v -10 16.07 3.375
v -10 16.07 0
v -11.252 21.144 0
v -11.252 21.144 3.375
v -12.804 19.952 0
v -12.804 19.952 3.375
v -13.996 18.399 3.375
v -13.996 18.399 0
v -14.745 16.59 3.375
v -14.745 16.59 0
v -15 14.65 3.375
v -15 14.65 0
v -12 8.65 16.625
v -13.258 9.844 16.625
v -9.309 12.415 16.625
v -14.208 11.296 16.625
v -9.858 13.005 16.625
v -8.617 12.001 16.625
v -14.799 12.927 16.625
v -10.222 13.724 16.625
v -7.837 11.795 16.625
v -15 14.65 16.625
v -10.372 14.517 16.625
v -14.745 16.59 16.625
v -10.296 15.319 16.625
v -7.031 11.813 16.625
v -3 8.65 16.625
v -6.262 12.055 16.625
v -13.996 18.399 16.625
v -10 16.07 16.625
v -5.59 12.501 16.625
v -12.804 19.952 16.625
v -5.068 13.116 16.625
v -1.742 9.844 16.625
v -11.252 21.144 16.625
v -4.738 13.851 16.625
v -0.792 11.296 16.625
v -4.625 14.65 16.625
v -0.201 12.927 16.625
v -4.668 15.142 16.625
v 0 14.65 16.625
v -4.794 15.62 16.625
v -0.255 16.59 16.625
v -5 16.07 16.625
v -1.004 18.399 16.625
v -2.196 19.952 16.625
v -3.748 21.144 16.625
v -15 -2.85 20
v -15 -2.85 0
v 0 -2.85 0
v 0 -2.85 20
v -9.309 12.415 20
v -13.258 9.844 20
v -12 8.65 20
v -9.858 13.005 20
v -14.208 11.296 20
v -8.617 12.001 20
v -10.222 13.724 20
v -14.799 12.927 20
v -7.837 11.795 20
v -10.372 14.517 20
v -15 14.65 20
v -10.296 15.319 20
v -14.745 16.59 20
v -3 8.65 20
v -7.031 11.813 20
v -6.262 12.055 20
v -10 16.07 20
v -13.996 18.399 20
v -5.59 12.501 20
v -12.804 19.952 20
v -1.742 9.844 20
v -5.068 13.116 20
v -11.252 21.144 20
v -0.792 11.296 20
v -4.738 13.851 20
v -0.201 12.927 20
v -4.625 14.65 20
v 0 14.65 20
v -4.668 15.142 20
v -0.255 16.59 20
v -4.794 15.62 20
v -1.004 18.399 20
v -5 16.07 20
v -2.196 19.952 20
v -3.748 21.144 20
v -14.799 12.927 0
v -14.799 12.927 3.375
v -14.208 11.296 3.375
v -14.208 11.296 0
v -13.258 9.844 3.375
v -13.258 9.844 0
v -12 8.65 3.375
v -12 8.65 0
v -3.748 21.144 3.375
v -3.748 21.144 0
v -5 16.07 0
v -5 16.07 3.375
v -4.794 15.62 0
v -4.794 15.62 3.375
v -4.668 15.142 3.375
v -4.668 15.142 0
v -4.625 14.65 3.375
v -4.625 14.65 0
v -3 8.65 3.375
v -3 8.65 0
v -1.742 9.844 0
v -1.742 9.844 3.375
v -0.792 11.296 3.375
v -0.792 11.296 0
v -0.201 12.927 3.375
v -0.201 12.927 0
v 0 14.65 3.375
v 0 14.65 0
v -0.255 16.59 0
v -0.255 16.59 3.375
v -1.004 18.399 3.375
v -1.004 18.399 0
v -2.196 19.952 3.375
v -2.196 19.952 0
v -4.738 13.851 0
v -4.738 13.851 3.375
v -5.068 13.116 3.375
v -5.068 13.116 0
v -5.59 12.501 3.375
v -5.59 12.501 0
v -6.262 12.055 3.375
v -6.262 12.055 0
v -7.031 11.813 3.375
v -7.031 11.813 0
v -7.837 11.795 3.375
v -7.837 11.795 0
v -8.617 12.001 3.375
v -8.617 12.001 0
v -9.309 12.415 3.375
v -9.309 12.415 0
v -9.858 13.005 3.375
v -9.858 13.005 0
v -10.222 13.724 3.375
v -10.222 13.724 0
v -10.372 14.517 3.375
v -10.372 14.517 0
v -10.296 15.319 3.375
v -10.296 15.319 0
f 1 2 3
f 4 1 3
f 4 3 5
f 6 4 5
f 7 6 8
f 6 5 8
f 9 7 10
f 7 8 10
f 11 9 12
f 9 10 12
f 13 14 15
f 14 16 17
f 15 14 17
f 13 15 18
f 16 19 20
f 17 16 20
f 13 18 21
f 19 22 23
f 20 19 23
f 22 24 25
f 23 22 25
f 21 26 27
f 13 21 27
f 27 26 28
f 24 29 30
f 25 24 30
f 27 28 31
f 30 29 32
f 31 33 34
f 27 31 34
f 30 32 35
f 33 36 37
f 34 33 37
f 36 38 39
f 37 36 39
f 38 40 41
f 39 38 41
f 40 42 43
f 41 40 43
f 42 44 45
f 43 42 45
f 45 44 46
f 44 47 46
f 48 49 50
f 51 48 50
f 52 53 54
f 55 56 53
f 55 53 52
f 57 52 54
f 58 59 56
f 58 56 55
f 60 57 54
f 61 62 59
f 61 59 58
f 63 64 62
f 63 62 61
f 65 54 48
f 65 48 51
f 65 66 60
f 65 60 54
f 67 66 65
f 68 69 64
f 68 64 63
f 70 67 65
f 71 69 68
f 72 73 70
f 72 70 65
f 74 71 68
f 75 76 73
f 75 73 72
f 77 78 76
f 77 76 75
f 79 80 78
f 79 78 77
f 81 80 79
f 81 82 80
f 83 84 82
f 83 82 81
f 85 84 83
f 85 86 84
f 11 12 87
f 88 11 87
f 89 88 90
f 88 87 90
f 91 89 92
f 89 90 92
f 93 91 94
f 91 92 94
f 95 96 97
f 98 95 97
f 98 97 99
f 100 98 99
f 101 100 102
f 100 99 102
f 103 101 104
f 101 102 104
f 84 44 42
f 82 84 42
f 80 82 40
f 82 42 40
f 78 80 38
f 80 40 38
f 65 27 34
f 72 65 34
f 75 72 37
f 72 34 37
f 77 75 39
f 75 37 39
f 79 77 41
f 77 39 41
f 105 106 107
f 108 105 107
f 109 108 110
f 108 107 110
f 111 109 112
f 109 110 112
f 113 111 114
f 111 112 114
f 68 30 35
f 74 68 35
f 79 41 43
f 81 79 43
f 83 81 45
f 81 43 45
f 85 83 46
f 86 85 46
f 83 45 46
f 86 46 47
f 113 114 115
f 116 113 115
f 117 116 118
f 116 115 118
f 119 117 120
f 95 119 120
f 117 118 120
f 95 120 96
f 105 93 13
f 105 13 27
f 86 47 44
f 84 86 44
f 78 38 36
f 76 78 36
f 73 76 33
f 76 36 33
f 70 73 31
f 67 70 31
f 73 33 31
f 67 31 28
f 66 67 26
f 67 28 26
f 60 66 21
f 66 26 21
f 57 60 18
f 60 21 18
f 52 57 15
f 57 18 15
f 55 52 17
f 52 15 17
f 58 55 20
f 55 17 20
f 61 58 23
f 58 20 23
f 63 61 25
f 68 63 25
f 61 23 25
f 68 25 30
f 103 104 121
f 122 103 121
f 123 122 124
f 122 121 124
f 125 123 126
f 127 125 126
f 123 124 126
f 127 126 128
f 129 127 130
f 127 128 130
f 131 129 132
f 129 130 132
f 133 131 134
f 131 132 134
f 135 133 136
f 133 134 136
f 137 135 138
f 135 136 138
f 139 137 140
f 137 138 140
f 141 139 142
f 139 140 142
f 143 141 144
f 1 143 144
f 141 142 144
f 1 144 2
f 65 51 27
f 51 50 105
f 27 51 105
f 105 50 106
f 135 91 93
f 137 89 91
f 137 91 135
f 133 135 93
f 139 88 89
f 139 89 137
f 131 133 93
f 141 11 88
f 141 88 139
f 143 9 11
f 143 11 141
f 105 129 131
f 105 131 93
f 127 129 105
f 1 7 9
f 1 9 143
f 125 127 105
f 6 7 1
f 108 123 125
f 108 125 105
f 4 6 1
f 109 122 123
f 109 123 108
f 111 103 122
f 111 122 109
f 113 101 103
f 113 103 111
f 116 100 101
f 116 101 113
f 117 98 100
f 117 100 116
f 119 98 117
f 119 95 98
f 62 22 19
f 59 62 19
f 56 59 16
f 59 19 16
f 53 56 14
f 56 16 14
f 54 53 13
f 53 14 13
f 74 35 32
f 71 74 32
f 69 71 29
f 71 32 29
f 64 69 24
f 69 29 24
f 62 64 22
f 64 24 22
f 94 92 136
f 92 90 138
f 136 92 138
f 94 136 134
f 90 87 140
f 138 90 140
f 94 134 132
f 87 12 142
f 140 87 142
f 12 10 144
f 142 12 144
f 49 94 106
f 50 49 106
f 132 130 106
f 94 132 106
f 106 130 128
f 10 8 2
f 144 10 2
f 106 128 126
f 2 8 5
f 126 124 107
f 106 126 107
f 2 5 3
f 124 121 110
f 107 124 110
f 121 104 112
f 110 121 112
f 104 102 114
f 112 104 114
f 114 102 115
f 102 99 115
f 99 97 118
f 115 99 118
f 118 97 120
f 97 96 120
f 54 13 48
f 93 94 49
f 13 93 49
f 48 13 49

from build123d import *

# Parameters (mm, degrees)
F1_DEPTH = 20
F2_DEPTH = 16.625
F3_DEPTH = 3.375


with BuildPart() as f1:
    # F0 (on Top) → F1 (new body)
    with BuildSketch(Plane.XY):
        with BuildLine():
            ThreePointArc((-11.25185, 21.143954), (-13.995725, 18.398907), (-15, 14.649832))
            ThreePointArc((-15, 14.649832), (-14.208204, 11.29573), (-12, 8.649832))
            Line((-12, 8.649832), (-3, 8.649832))
            ThreePointArc((-3, 8.649832), (-0.791796, 11.29573), (0, 14.649832))
            ThreePointArc((0, 14.649832), (-1.004275, 18.398907), (-3.74815, 21.143954))
            Line((-3.74815, 21.143954), (-5, 16.069559))
            ThreePointArc((-5, 16.069559), (-4.720331, 15.384041), (-4.625, 14.649832))
            ThreePointArc((-4.625, 14.649832), (-8.234209, 11.870163), (-10, 16.069559))
            Line((-10, 16.069559), (-11.25185, 21.143954))
        make_face()
        with BuildLine():
            Line((-12, 8.649832), (-15, -2.850168))
            Line((-15, -2.850168), (0, -2.850168))
            Line((0, -2.850168), (-3, 8.649832))
            ThreePointArc((-3, 8.649832), (-7.5, 7.149832), (-12, 8.649832))
        make_face()
        with BuildLine():
            Line((-3, 8.649832), (-12, 8.649832))
            ThreePointArc((-12, 8.649832), (-7.5, 7.149832), (-3, 8.649832))
        make_face()
    extrude(amount=F1_DEPTH)

    # F0 (on Top) → F2 (cut)
    with BuildSketch(Plane.XY):
        with BuildLine():
            ThreePointArc((-11.25185, 21.143954), (-13.995725, 18.398907), (-15, 14.649832))
            ThreePointArc((-15, 14.649832), (-14.208204, 11.29573), (-12, 8.649832))
            Line((-12, 8.649832), (-3, 8.649832))
            ThreePointArc((-3, 8.649832), (-0.791796, 11.29573), (0, 14.649832))
            ThreePointArc((0, 14.649832), (-1.004275, 18.398907), (-3.74815, 21.143954))
            Line((-3.74815, 21.143954), (-5, 16.069559))
            ThreePointArc((-5, 16.069559), (-4.720331, 15.384041), (-4.625, 14.649832))
            ThreePointArc((-4.625, 14.649832), (-8.234209, 11.870163), (-10, 16.069559))
            Line((-10, 16.069559), (-11.25185, 21.143954))
        make_face()
    extrude(amount=F2_DEPTH, mode=Mode.SUBTRACT)

    # F0 (on Top) → F3 (join)
    with BuildSketch(Plane.XY):
        with BuildLine():
            ThreePointArc((-11.25185, 21.143954), (-13.995725, 18.398907), (-15, 14.649832))
            ThreePointArc((-15, 14.649832), (-14.208204, 11.29573), (-12, 8.649832))
            Line((-12, 8.649832), (-3, 8.649832))
            ThreePointArc((-3, 8.649832), (-0.791796, 11.29573), (0, 14.649832))
            ThreePointArc((0, 14.649832), (-1.004275, 18.398907), (-3.74815, 21.143954))
            Line((-3.74815, 21.143954), (-5, 16.069559))
            ThreePointArc((-5, 16.069559), (-4.720331, 15.384041), (-4.625, 14.649832))
            ThreePointArc((-4.625, 14.649832), (-8.234209, 11.870163), (-10, 16.069559))
            Line((-10, 16.069559), (-11.25185, 21.143954))
        make_face()
    extrude(amount=F3_DEPTH)


solid = f1.part
